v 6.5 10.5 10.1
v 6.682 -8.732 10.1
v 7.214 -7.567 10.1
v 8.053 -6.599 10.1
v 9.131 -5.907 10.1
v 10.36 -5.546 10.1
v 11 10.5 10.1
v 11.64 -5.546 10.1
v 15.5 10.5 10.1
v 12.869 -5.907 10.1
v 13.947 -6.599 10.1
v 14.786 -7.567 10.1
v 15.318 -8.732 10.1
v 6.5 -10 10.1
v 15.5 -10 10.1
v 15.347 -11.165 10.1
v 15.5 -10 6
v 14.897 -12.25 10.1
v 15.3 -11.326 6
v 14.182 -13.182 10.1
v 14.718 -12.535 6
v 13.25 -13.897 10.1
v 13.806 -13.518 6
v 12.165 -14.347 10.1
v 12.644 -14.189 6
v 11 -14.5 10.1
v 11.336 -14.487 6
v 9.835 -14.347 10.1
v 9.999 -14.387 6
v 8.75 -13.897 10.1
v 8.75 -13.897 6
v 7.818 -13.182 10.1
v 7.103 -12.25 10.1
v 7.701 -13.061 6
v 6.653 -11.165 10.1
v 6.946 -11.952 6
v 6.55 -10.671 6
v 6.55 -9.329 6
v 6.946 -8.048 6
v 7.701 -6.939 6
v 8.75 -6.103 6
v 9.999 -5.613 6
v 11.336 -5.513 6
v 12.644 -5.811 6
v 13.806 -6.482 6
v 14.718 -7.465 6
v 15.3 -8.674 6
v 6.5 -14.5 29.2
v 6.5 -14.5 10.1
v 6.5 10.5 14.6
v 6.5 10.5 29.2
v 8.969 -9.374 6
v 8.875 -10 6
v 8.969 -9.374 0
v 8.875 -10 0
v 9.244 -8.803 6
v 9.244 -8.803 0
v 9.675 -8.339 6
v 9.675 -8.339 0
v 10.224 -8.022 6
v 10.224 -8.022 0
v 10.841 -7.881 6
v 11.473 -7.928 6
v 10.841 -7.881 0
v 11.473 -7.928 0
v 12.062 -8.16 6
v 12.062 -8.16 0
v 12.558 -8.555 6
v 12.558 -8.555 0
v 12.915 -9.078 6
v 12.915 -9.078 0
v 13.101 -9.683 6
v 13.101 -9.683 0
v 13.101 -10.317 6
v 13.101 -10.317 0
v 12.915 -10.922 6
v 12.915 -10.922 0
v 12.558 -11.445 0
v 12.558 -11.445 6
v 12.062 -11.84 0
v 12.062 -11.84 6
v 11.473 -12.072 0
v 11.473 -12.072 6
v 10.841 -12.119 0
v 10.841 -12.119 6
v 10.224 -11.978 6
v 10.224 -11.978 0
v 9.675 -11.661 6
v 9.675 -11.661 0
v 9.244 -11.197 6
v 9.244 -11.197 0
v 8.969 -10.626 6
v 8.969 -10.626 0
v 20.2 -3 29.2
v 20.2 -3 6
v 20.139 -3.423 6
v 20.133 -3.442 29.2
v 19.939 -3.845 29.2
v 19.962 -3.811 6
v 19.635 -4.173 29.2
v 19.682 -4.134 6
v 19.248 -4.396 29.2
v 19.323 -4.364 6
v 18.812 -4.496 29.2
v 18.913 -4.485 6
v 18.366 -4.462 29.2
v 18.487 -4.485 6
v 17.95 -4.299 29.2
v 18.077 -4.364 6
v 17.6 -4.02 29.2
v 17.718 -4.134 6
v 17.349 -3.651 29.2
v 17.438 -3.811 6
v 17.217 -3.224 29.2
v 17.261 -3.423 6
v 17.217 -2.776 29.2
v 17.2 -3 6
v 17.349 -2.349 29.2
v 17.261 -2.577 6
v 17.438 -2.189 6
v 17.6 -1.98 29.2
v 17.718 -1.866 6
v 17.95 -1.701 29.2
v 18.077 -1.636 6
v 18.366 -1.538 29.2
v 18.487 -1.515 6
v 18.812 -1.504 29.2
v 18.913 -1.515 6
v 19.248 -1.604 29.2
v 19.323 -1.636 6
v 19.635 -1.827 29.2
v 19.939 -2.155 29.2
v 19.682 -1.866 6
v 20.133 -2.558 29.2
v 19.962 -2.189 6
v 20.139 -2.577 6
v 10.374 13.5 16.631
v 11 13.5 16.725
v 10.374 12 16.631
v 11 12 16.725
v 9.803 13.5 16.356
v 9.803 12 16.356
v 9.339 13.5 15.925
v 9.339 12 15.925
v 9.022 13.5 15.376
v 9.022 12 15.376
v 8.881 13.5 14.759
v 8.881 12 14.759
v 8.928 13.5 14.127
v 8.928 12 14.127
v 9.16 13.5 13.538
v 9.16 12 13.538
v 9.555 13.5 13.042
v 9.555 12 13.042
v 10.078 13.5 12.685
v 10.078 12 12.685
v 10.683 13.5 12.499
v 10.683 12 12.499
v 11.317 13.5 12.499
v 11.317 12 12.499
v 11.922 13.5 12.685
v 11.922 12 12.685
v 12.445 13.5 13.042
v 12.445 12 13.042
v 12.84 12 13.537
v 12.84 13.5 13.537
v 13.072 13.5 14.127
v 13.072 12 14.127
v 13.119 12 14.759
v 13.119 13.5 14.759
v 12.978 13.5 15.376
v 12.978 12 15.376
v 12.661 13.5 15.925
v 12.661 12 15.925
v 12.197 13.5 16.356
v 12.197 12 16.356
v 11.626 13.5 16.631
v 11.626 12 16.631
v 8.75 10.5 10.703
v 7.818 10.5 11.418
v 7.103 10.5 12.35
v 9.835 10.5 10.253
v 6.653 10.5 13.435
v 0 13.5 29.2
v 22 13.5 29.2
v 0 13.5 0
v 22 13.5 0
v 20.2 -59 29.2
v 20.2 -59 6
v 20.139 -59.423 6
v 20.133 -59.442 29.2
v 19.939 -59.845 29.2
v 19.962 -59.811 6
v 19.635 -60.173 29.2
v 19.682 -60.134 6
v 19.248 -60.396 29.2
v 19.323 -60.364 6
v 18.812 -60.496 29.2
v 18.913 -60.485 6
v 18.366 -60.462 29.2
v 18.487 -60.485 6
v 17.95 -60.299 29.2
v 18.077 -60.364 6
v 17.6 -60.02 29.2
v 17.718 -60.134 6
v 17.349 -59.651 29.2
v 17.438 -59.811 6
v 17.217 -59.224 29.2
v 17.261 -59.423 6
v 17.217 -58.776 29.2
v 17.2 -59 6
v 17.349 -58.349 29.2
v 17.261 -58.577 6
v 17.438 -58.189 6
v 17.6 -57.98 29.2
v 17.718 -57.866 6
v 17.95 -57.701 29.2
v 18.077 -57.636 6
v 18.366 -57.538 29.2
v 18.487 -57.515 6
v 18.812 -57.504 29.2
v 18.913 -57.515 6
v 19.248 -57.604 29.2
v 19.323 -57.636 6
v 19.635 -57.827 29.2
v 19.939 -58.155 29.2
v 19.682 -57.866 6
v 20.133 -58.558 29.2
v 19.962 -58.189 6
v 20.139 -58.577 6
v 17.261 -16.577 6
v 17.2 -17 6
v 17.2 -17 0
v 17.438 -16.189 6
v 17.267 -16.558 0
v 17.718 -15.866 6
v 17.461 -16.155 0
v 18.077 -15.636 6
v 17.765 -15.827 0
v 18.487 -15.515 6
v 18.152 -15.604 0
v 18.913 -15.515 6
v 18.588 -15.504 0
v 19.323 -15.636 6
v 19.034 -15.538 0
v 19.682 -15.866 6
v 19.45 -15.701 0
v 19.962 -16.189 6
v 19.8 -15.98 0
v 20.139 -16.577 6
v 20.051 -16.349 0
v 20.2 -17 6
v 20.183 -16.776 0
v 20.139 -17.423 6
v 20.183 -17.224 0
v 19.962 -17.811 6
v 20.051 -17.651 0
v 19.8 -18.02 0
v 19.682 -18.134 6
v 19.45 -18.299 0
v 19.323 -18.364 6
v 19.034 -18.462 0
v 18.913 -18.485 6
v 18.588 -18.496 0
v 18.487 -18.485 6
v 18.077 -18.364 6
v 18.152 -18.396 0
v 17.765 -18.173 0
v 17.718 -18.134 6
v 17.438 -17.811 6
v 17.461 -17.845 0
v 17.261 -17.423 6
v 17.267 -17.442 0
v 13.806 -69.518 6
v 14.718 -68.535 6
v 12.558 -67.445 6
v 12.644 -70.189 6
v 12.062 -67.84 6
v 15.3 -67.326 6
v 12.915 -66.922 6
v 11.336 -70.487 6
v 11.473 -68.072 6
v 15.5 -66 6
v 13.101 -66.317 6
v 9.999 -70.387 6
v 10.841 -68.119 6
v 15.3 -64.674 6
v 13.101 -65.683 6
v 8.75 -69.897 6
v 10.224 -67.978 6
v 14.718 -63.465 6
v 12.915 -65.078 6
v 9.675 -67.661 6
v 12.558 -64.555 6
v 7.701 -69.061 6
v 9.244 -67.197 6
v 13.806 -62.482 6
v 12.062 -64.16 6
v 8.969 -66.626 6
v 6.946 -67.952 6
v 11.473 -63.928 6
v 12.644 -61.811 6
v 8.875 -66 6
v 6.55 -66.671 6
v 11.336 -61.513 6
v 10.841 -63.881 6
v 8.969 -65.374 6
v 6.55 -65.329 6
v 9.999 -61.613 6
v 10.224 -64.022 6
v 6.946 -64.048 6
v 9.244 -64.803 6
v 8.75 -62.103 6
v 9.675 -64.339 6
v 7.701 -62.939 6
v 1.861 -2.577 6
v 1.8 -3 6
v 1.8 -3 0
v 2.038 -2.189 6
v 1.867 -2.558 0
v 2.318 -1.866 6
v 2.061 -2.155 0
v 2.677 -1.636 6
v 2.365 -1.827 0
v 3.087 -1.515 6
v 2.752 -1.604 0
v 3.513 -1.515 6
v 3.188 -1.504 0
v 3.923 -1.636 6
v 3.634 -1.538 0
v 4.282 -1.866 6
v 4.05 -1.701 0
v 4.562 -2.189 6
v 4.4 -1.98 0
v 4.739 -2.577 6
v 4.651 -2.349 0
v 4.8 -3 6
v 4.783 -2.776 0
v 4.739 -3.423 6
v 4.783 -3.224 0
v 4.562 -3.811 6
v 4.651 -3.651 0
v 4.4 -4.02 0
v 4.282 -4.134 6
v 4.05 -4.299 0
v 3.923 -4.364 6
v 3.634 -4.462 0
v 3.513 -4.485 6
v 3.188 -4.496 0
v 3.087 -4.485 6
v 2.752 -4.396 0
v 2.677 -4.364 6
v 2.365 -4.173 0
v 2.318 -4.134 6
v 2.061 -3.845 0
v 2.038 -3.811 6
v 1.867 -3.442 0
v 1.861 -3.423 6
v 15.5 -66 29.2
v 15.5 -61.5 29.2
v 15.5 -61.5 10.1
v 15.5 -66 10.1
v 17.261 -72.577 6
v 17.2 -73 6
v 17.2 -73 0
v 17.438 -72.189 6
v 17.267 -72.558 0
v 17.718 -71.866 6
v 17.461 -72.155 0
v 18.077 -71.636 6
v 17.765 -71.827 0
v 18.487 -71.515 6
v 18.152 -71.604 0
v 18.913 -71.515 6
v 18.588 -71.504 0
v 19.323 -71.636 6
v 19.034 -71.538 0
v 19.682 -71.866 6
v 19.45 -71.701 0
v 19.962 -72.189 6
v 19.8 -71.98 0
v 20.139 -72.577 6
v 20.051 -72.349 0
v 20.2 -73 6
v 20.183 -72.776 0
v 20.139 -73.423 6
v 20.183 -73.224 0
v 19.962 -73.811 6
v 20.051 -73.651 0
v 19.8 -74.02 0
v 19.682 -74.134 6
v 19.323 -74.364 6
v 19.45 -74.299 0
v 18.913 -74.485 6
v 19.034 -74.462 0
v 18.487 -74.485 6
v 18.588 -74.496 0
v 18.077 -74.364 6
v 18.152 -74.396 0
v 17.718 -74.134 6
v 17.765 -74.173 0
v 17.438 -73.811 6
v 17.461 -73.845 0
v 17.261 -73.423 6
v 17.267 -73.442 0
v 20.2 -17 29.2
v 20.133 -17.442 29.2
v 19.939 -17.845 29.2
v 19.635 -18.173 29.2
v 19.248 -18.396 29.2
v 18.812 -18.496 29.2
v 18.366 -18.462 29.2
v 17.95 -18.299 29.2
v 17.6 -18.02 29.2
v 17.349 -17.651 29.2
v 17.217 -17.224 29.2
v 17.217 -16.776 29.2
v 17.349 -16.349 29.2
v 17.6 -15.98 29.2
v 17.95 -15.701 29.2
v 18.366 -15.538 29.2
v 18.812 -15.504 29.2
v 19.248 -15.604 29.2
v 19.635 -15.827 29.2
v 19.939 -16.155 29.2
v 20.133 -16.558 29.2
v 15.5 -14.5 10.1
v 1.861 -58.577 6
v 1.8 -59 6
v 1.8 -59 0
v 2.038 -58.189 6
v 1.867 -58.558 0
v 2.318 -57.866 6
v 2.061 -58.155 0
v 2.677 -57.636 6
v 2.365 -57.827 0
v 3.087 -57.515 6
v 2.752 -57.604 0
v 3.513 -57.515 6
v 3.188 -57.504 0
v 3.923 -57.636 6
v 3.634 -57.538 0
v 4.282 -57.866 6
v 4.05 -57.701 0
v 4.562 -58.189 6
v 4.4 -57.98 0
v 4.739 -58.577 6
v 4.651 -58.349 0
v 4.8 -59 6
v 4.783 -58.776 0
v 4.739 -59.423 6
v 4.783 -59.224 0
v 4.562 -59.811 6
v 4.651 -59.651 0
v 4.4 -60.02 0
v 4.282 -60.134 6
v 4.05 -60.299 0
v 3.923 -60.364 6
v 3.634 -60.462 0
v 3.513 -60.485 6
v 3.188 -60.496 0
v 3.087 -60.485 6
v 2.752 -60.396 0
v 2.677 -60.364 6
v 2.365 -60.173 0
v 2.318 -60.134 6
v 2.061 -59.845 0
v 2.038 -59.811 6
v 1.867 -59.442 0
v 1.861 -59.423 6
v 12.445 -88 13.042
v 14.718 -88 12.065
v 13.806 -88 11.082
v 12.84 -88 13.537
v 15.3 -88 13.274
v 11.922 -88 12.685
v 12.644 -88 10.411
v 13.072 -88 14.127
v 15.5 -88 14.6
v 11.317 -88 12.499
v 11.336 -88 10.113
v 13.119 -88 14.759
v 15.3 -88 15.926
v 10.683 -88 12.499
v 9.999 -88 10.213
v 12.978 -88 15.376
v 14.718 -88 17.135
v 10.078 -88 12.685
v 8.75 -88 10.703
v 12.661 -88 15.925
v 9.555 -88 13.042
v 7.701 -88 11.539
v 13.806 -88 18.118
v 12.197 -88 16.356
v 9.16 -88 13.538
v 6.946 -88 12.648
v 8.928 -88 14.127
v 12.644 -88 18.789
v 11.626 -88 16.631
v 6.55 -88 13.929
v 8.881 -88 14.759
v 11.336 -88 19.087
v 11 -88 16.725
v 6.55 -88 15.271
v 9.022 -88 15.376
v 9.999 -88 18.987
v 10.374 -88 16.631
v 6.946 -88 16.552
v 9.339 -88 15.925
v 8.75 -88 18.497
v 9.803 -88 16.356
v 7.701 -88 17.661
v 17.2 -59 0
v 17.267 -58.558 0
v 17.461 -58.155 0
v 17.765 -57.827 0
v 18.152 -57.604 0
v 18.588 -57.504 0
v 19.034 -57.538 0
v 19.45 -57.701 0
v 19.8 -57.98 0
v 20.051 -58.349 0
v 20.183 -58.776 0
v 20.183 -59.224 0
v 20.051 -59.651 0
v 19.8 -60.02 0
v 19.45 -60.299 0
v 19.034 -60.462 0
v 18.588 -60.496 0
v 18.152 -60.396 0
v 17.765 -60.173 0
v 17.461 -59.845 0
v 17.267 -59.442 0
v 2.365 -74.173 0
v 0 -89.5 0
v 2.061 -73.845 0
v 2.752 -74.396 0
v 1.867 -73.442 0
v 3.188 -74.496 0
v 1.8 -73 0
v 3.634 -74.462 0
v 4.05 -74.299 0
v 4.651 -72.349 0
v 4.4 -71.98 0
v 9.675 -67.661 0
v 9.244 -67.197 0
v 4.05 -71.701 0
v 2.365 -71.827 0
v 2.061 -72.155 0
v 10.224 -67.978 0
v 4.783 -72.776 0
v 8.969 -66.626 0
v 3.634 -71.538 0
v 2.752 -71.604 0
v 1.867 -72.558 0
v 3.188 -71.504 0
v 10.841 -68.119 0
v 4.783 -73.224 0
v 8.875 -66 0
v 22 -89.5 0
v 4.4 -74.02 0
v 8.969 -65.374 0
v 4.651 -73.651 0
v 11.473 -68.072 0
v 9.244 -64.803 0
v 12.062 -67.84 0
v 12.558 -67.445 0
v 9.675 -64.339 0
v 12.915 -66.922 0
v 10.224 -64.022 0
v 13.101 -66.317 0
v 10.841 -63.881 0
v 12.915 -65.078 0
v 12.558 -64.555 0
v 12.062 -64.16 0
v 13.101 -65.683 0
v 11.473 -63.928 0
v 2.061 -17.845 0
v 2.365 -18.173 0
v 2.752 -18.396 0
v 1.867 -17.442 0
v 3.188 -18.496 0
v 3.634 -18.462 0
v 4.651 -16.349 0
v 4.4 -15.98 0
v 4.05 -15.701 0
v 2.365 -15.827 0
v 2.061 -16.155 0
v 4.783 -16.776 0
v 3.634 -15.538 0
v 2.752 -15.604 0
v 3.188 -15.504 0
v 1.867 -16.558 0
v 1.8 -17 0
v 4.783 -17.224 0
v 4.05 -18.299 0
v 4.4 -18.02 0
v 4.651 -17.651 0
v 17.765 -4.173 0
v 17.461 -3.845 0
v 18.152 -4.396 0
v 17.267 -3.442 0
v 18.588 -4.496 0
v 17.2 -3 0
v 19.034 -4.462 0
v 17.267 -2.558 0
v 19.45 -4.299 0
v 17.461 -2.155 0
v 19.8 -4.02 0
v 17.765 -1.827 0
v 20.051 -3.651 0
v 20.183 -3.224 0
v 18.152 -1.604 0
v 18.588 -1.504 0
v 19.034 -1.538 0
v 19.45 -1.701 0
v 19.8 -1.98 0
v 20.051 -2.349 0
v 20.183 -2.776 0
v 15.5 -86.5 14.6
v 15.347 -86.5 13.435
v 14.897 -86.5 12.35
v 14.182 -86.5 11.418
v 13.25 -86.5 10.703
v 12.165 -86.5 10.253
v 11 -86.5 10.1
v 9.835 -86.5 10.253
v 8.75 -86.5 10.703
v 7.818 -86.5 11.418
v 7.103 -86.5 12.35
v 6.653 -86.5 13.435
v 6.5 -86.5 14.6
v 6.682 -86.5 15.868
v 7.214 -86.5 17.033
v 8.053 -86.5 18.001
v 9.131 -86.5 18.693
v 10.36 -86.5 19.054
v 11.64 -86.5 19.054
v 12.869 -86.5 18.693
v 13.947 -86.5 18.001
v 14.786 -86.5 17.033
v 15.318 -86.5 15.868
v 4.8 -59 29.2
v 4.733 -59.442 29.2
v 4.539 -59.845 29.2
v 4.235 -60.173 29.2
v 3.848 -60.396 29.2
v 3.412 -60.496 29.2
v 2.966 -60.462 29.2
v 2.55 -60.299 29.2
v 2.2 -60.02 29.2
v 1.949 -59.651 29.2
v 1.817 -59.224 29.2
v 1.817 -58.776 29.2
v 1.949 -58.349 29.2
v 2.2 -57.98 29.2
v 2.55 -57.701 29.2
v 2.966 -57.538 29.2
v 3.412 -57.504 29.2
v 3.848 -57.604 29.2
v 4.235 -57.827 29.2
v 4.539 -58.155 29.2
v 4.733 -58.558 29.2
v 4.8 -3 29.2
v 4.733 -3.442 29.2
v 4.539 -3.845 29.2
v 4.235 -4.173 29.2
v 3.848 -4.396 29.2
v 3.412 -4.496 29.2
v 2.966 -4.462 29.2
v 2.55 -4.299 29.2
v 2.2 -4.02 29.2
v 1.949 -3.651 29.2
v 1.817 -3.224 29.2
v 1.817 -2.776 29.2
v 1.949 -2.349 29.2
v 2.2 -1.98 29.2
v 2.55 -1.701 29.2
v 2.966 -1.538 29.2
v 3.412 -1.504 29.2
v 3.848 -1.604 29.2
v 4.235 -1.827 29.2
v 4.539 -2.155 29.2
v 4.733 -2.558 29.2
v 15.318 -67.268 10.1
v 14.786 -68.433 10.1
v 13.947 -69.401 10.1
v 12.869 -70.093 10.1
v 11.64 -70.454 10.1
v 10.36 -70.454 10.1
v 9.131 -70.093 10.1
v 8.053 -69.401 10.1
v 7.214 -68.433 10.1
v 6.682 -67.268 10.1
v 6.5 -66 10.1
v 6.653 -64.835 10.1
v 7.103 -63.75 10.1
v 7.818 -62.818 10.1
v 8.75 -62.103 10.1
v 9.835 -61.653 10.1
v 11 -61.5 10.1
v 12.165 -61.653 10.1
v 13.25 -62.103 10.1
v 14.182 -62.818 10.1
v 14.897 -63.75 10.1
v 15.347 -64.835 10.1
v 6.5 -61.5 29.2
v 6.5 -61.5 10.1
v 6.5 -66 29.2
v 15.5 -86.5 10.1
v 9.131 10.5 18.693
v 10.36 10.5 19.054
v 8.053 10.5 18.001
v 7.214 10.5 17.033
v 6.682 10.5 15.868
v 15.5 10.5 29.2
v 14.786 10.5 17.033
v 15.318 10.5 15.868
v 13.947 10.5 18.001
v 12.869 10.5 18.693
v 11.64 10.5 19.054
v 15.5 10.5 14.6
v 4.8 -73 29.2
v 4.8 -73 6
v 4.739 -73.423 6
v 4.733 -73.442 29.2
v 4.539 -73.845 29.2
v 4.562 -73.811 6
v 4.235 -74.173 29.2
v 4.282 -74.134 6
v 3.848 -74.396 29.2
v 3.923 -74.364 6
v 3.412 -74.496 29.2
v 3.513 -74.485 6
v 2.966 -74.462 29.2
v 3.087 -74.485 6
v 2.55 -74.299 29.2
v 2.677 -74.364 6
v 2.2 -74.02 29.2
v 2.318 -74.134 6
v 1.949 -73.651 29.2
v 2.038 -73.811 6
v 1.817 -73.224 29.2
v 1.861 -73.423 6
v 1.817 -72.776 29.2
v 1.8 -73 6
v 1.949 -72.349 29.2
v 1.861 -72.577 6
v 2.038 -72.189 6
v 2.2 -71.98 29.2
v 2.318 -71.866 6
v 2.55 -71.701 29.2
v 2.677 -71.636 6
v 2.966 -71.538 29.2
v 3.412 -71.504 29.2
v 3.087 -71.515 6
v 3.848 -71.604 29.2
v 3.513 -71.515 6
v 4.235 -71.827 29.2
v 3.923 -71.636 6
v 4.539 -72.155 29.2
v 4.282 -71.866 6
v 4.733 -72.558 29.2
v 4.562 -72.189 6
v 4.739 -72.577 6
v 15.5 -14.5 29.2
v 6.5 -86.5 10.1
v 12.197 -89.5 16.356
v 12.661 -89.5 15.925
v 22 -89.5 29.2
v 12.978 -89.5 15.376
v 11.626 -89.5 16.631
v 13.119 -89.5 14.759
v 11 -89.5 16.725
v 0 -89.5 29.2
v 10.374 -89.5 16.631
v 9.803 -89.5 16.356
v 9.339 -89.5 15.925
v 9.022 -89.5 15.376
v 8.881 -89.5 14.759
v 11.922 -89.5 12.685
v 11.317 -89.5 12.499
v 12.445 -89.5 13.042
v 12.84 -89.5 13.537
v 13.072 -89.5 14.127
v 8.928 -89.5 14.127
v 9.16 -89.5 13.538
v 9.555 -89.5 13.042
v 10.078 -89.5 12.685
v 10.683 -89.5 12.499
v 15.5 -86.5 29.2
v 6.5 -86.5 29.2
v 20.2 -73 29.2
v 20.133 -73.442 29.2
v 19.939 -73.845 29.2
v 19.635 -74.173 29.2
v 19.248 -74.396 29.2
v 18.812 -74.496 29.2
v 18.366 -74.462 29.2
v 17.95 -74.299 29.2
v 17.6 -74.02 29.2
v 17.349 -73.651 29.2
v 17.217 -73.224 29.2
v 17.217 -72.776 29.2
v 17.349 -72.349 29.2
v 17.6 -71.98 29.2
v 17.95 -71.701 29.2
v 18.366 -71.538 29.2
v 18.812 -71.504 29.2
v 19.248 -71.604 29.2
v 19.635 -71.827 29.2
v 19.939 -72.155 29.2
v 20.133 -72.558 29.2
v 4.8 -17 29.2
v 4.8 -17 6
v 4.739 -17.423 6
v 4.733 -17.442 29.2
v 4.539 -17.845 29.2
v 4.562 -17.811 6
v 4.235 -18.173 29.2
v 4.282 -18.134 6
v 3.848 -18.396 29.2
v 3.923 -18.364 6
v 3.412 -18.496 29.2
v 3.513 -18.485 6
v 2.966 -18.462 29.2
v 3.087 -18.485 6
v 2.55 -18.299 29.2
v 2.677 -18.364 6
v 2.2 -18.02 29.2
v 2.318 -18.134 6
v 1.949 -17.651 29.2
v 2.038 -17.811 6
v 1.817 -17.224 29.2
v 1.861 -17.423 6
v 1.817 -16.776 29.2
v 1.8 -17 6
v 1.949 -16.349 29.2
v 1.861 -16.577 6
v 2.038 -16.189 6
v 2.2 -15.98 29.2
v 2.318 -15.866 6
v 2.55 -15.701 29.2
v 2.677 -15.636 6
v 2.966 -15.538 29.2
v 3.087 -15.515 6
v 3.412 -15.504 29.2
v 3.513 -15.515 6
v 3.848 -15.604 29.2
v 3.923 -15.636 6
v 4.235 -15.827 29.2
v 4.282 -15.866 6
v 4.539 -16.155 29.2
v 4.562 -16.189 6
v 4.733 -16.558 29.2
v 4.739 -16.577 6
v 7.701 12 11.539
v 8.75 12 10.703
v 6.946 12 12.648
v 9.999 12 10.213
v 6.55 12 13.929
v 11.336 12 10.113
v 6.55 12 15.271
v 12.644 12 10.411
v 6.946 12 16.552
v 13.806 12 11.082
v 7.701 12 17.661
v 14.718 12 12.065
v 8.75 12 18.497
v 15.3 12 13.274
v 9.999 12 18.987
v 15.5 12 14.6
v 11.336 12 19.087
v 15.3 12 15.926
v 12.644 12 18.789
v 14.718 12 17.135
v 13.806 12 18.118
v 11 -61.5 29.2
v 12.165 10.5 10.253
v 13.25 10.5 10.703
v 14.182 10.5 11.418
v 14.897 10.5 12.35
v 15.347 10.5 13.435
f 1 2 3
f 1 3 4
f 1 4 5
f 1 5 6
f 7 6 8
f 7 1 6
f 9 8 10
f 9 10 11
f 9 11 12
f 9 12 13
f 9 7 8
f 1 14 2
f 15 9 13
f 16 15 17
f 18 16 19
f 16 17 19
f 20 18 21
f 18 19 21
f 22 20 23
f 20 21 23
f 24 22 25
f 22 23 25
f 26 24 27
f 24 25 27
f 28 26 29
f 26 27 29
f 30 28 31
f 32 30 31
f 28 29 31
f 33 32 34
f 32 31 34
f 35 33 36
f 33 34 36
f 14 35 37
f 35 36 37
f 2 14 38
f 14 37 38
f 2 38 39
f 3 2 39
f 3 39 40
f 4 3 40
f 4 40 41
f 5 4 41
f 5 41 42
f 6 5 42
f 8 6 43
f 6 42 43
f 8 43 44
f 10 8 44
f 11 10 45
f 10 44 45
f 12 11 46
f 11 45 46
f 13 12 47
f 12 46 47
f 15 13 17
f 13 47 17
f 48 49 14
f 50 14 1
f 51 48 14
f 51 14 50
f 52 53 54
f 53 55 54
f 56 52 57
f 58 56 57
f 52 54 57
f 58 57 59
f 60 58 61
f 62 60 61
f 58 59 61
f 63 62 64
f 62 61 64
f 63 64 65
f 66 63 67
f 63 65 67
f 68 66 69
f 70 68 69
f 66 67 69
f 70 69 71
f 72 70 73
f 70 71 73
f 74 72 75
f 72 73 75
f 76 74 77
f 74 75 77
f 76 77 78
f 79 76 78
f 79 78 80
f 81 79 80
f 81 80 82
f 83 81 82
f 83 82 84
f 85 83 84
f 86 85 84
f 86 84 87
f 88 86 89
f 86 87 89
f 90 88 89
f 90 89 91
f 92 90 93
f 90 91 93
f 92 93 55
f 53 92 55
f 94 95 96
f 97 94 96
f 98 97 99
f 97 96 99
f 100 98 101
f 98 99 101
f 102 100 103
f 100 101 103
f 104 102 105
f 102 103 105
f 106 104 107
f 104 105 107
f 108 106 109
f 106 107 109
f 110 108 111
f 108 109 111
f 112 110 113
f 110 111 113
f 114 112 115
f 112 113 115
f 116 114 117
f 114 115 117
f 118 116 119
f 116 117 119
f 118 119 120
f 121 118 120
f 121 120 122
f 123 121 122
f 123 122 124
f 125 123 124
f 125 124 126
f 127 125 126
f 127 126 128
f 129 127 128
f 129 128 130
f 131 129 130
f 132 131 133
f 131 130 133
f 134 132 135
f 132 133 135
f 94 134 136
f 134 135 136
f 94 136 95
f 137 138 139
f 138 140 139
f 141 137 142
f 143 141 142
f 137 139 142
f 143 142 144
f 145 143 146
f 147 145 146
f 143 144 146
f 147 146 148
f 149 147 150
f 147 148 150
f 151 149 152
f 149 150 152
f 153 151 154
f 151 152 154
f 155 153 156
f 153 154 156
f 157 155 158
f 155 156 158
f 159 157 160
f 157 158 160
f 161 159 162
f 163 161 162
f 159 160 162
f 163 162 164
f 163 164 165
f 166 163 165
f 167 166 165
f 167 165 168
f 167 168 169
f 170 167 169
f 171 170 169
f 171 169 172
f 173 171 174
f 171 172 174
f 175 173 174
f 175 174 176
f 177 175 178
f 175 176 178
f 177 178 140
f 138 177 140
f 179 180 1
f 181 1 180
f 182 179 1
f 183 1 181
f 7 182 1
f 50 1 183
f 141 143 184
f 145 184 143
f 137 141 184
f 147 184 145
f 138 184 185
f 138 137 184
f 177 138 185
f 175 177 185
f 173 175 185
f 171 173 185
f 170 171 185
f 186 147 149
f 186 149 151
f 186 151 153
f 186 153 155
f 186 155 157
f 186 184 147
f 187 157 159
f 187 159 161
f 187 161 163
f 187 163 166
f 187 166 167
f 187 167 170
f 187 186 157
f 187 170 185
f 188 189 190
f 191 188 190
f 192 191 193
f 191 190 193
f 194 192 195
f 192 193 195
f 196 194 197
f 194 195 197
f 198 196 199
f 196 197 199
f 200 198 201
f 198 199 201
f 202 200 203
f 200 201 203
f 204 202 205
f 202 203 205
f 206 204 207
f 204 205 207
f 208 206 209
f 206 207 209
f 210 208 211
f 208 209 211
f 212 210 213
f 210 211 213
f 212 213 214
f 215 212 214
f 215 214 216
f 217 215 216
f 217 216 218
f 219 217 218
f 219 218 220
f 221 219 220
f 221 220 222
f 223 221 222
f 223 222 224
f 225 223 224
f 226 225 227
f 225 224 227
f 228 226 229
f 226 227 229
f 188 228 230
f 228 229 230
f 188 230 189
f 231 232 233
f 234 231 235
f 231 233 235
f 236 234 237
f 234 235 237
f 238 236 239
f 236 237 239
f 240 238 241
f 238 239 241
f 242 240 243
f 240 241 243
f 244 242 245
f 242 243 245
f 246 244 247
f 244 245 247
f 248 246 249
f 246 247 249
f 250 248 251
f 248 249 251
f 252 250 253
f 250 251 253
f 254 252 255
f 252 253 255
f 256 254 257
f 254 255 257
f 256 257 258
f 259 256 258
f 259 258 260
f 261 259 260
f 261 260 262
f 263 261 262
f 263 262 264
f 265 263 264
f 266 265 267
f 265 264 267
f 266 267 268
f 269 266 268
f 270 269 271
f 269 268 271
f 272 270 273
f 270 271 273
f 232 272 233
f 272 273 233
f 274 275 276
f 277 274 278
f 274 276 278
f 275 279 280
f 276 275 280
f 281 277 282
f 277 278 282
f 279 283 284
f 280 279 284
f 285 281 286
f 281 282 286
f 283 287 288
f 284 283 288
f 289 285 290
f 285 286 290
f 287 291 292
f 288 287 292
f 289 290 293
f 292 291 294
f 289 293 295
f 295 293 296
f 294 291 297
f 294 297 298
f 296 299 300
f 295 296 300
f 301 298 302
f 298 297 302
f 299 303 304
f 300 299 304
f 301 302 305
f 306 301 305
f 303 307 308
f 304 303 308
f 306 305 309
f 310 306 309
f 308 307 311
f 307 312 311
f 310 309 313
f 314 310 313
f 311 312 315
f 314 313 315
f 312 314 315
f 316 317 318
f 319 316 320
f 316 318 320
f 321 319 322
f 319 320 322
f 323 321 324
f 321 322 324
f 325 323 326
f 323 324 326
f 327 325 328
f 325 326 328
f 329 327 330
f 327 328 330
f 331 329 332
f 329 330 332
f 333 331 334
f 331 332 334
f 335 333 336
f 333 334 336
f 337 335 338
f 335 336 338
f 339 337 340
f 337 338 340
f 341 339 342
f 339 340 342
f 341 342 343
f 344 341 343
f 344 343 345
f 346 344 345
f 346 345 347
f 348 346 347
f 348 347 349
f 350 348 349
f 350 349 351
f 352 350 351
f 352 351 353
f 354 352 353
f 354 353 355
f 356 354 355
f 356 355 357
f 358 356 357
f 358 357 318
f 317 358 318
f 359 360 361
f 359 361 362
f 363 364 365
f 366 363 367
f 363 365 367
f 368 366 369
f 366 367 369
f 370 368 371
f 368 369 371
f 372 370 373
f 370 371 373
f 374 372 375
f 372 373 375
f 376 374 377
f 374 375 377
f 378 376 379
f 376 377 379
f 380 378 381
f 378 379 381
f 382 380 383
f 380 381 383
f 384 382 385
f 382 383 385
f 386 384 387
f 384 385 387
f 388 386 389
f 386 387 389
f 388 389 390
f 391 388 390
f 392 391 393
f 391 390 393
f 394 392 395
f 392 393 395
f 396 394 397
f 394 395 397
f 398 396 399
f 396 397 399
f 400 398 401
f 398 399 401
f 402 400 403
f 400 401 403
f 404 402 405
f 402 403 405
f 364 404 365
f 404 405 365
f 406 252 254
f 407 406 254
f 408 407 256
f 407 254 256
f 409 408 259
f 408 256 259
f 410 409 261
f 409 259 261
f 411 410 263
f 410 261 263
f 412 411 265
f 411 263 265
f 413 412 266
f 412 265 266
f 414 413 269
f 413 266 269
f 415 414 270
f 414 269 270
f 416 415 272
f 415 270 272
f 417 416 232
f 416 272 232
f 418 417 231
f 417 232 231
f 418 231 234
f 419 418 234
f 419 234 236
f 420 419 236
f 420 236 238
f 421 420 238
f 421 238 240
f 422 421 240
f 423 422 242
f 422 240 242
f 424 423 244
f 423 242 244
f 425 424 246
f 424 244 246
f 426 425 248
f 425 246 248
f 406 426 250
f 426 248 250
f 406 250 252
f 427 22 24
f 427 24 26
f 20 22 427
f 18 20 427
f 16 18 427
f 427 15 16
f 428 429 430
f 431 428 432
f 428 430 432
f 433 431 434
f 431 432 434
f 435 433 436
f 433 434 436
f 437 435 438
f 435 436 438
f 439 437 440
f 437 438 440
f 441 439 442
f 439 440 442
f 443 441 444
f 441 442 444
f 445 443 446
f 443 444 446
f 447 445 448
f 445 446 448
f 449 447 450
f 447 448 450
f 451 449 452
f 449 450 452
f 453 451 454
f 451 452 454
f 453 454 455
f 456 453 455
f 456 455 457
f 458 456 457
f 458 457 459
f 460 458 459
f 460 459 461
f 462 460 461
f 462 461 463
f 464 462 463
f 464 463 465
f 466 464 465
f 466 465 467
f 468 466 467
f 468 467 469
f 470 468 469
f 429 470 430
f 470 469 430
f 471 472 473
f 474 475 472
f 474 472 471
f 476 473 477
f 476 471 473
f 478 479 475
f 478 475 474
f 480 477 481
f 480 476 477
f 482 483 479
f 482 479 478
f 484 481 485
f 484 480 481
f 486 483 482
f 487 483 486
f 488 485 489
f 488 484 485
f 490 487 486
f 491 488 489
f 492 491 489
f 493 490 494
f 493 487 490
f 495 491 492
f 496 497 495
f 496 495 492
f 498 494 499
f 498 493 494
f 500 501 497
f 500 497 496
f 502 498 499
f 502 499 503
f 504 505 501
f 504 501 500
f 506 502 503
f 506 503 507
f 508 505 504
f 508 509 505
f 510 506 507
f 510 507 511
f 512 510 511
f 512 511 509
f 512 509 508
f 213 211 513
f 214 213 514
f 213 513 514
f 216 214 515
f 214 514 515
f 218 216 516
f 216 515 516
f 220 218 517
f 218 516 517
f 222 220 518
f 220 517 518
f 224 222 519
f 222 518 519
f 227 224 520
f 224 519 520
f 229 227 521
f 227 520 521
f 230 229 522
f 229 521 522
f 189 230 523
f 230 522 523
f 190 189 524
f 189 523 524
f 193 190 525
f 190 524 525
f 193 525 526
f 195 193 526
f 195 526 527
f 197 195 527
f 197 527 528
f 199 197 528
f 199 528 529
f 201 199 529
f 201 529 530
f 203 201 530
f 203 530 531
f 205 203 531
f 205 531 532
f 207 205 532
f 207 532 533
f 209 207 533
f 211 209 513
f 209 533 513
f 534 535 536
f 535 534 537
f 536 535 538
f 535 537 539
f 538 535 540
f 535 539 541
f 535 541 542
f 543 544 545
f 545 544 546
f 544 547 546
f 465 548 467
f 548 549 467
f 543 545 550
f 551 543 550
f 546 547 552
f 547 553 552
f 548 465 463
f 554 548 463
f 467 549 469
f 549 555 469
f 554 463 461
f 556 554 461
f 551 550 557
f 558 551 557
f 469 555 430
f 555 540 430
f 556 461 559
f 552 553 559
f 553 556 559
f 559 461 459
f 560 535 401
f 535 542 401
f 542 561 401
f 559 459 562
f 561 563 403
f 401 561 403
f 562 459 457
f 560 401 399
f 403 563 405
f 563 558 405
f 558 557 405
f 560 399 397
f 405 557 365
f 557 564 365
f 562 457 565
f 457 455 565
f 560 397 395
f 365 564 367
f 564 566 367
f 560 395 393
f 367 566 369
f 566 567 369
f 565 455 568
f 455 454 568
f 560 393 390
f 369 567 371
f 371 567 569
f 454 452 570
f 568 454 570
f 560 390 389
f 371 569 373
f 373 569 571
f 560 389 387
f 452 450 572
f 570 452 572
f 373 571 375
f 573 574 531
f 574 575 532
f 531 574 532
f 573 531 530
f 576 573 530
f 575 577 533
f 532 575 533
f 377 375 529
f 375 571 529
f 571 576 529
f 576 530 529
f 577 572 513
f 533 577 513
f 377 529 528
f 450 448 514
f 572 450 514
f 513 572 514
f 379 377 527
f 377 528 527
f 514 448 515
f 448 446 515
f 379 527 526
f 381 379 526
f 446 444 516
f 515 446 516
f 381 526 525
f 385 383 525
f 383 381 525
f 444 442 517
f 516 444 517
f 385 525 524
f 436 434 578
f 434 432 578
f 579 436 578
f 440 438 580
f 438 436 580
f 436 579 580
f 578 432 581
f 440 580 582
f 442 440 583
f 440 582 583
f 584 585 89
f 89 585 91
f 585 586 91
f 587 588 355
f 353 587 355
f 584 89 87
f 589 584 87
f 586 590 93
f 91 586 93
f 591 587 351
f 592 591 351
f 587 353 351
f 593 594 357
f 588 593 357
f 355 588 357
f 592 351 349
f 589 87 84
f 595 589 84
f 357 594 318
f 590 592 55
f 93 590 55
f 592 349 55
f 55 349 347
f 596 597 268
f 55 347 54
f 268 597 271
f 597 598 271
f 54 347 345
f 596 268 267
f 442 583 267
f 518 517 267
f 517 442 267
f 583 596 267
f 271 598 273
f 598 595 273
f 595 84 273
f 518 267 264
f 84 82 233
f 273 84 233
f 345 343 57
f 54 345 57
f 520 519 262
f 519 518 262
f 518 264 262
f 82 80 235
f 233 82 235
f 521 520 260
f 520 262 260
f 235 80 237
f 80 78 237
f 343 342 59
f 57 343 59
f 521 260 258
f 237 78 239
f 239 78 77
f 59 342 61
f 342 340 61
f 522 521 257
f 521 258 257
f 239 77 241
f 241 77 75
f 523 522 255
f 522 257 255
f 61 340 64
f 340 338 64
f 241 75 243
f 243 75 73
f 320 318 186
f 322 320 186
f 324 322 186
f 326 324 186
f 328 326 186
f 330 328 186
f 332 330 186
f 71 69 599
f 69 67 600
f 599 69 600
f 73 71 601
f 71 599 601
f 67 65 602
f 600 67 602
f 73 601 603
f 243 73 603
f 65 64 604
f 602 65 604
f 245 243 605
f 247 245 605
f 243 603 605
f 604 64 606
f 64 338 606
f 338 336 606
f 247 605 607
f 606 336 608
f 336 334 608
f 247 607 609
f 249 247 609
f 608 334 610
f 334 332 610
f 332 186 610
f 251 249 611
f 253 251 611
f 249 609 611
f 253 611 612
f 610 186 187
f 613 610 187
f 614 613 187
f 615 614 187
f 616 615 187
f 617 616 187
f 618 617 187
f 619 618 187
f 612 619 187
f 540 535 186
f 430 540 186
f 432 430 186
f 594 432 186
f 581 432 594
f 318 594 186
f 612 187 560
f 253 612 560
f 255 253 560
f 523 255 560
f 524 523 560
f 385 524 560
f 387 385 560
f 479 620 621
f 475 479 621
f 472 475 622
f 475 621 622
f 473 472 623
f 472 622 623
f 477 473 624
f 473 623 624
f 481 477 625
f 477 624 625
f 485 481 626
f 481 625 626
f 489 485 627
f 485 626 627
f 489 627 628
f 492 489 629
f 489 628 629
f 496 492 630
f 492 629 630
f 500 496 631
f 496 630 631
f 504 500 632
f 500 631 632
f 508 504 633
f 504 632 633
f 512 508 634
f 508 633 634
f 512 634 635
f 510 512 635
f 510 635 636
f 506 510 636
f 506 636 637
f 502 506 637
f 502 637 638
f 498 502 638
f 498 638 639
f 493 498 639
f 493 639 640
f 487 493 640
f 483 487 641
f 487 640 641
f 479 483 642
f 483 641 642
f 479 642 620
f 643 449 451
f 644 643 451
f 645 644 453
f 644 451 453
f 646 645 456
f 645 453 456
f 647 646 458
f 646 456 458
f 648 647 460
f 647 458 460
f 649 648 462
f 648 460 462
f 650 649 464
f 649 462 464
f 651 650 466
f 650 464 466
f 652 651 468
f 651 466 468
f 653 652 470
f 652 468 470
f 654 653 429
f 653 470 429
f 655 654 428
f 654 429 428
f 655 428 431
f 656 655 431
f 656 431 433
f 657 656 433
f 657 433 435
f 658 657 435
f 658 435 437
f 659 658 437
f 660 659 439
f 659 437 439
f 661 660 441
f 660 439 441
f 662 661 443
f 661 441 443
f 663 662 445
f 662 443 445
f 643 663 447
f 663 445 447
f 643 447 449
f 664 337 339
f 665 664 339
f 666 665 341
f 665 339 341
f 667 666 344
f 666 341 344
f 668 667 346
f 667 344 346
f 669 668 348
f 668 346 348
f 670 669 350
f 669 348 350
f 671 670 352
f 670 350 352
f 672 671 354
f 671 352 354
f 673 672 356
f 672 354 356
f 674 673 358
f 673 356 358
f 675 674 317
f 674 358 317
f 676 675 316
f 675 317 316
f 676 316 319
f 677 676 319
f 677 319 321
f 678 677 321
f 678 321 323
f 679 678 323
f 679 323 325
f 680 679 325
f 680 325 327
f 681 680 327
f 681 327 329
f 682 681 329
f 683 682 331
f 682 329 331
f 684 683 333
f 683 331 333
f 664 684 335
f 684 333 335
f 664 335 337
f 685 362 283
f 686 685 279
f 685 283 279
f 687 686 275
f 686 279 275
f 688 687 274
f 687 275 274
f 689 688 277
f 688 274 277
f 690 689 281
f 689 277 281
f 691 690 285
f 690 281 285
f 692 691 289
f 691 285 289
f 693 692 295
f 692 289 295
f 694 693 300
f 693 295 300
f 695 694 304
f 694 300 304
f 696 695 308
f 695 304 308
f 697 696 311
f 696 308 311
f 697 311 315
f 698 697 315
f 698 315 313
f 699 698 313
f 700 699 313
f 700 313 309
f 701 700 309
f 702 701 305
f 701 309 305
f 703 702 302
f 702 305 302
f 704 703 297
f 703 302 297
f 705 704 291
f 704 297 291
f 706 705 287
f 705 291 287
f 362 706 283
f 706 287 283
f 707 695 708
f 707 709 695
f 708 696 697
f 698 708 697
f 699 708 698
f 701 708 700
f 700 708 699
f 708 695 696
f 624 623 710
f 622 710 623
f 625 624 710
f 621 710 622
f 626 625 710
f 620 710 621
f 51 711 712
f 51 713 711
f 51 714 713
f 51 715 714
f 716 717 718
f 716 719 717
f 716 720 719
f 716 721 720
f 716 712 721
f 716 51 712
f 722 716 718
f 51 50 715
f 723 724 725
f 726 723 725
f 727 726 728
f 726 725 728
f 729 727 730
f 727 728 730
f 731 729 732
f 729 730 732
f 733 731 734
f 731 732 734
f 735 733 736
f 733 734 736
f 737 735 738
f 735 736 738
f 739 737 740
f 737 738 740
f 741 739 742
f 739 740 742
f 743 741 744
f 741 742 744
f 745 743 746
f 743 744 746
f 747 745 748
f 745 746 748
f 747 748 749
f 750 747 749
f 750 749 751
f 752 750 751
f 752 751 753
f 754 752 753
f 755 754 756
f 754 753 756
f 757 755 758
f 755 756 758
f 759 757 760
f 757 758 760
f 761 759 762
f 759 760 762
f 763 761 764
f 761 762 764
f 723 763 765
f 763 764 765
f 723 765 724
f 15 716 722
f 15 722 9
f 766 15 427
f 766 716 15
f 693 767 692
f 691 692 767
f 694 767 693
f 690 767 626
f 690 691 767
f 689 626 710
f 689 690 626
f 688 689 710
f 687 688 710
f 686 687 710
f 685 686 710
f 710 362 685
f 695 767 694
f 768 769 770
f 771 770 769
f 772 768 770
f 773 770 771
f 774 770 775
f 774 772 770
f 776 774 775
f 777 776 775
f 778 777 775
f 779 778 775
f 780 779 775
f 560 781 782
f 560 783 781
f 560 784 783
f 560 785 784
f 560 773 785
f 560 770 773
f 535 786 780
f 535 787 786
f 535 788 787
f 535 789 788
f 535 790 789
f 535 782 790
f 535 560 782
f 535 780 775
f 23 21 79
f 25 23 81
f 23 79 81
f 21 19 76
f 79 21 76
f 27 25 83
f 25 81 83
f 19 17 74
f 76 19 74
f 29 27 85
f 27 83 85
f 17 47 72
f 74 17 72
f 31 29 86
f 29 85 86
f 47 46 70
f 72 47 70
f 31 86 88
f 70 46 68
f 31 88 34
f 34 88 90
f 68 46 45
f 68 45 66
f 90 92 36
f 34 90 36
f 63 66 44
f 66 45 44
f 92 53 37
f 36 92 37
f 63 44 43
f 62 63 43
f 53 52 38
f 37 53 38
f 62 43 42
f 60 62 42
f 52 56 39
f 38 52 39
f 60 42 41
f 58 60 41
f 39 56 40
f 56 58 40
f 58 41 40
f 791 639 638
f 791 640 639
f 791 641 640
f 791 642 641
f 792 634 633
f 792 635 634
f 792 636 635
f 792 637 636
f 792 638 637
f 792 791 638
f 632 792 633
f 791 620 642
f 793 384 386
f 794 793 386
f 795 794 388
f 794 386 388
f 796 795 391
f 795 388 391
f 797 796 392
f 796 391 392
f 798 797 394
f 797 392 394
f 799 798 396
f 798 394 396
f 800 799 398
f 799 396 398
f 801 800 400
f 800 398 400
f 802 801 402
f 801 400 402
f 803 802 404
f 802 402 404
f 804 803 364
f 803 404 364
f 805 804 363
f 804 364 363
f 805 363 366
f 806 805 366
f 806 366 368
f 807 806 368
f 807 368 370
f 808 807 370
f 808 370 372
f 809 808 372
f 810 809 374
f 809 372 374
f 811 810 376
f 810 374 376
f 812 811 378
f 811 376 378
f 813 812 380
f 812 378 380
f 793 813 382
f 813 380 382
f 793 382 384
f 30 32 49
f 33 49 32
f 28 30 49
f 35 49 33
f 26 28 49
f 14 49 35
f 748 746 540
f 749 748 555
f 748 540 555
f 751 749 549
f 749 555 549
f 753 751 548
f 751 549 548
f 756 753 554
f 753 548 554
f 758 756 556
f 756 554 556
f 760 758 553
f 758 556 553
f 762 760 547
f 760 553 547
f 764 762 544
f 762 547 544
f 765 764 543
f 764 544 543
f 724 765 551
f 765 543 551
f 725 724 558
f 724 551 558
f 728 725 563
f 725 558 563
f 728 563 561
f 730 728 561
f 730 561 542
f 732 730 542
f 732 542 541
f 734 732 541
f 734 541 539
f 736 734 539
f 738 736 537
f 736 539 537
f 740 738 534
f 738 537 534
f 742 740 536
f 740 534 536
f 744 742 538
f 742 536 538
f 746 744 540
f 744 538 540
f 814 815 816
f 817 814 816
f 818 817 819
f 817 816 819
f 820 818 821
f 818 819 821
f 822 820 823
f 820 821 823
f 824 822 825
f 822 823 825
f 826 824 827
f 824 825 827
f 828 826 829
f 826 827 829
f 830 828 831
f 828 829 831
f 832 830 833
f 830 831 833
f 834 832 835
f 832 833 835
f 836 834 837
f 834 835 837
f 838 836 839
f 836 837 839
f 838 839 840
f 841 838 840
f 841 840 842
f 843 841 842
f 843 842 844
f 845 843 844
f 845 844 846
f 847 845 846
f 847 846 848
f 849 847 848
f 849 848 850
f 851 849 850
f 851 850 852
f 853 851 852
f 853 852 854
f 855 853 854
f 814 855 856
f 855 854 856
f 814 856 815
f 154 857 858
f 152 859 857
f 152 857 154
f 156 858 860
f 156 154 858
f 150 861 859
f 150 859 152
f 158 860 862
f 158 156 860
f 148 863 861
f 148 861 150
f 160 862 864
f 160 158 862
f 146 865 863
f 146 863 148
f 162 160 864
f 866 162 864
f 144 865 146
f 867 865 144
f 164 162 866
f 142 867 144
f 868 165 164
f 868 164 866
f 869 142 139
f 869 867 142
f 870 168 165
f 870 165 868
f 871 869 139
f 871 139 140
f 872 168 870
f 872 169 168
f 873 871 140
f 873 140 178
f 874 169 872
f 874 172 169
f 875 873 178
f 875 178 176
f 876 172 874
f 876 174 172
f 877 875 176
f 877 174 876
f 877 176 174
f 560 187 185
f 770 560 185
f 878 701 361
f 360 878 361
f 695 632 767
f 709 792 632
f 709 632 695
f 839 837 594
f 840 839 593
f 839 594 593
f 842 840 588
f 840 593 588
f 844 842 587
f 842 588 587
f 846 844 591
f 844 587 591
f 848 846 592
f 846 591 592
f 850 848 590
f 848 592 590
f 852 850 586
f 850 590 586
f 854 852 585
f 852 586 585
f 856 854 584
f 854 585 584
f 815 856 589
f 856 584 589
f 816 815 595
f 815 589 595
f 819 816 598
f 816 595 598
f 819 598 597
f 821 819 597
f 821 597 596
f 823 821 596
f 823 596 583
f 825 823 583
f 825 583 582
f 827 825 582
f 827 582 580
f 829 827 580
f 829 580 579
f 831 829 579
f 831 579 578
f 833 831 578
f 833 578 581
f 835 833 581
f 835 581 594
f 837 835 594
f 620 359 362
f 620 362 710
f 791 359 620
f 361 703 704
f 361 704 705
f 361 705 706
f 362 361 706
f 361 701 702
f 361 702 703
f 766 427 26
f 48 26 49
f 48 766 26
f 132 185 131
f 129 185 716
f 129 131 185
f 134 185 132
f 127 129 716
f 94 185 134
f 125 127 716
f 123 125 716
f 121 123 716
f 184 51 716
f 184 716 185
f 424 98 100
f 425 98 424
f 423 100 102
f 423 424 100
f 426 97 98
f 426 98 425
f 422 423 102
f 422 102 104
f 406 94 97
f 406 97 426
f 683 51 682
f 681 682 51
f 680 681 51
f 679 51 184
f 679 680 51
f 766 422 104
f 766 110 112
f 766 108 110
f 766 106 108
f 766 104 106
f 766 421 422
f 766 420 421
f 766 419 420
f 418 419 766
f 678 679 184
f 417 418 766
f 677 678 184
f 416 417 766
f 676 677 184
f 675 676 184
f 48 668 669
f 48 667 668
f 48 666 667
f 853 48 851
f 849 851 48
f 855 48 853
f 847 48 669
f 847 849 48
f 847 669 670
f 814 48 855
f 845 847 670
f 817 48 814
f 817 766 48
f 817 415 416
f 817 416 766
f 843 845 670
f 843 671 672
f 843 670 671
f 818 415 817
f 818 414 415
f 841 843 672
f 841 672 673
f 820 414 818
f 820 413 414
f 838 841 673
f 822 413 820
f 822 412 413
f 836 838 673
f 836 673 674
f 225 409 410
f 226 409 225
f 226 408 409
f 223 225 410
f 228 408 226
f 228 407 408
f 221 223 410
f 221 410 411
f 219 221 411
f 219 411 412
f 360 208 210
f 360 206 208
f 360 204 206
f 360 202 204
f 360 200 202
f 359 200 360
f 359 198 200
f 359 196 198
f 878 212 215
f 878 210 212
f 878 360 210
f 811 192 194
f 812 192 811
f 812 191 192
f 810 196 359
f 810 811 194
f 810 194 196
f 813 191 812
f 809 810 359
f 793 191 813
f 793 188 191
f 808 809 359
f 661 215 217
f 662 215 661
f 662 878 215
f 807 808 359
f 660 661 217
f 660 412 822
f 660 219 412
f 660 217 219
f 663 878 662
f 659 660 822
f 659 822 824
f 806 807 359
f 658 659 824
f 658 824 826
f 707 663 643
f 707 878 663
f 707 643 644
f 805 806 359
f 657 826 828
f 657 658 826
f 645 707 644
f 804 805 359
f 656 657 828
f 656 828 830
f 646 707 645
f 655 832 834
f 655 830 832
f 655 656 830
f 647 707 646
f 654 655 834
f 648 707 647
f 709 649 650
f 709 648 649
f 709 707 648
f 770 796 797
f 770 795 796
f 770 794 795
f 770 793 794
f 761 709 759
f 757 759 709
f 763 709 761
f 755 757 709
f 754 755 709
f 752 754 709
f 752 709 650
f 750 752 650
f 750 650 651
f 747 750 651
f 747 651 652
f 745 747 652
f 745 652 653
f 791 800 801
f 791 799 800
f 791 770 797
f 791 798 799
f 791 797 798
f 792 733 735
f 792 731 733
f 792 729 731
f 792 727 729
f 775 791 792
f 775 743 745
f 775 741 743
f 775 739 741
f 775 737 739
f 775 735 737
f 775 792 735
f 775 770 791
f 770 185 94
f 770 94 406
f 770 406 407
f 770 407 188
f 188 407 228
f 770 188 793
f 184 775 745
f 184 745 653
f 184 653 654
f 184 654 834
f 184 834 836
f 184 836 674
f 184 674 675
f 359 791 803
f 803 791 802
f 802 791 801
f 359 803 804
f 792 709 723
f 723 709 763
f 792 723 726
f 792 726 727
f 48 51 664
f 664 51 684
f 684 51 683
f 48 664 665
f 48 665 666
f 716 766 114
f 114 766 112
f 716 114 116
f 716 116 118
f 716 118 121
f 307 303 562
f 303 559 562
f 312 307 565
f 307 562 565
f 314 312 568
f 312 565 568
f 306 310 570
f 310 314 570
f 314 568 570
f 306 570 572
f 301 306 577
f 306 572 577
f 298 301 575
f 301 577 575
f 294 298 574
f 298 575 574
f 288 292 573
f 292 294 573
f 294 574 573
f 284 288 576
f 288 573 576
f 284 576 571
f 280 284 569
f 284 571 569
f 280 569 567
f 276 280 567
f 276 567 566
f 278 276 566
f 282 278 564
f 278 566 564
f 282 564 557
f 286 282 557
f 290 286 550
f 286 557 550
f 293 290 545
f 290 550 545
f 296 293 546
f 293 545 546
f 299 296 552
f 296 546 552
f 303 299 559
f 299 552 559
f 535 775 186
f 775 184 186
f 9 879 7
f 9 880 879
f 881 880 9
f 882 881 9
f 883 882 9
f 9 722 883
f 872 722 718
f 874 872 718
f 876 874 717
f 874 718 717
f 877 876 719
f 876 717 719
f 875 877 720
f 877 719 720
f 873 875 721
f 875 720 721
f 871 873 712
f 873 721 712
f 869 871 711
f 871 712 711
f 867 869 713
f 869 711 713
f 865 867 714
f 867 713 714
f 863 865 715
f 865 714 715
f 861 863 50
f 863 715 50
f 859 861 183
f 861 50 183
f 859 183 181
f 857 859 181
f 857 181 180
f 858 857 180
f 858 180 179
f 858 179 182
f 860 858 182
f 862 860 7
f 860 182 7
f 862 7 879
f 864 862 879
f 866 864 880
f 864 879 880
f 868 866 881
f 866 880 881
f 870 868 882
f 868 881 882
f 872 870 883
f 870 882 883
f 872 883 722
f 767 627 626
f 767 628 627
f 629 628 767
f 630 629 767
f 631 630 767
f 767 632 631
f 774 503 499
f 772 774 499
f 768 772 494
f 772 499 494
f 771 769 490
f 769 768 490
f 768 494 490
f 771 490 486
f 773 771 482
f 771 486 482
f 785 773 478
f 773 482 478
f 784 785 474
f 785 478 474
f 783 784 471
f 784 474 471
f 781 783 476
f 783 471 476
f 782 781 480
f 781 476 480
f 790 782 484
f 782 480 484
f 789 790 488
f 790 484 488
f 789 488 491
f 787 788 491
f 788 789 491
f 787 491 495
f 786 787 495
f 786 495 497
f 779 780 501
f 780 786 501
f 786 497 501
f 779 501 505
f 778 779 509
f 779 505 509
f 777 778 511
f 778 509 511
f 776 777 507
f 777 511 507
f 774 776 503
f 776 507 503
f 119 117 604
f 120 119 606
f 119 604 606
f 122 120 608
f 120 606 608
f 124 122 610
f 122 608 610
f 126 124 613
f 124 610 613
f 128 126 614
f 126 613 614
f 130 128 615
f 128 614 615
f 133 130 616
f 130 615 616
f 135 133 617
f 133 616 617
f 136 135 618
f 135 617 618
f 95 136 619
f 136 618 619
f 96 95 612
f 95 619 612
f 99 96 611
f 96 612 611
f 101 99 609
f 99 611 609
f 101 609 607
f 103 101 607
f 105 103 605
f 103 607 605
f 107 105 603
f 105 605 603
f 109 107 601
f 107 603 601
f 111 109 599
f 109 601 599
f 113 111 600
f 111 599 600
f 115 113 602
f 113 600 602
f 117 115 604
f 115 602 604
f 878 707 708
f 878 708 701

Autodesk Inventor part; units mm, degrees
ref_plane "YZ Plane" through (0, 0, 0) normal (1, 0, 0) x (0, 1, 0)
ref_plane "XZ Plane" through (0, 0, 0) normal (0, 1, 0) x (-1, 0, 0)
ref_plane "XY Plane" through (0, 0, 0) normal (0, 0, 1) x (1, 0, 0)
ref_plane "Płaszczyzna konstrukcyjna1" through (33, 3, -33.6408) normal (0, 1, 0) x (0, 0, 1)
sketch "Szkic1" plane through (33, 3, -33.6408) normal (0, 1, 0) x (0, 0, 1)
  line L0 (33.6408, -11) -> (70.3592, -11) projected
  line L1 (33.6408, -33) -> (33.6408, -11) projected
  line L2 (33.6408, -11) -> (70.3592, -11)
  line L3 (70.3592, -11) -> (70.3592, -33)
  line L4 (70.3592, -33) -> (33.6408, -33)
  line L5 (33.6408, -33) -> (33.6408, -11)
extrude "Wyciągnięcie proste1" add sketch "Szkic1" against normal blind 3
sketch "Szkic2" plane through (33, 0, -33.6408) normal (0, -1, 0) x (1, 0, 0)
  line L0 (-11, 33.6408) -> (-33, 33.6408)
  line L1 (-33, 33.6408) -> (-33, 39.6408)
  line L2 (-33, 39.6408) -> (-11, 39.6408)
  line L3 (-11, 39.6408) -> (-11, 33.6408)
  line L4 (-33, 33.6408) -> (-11, 33.6408) projected
  line L5 (-11, 33.6408) -> (-11, 70.3592) projected
  line L6 (-33, 70.3592) -> (-33, 33.6408) projected
  dimension "d2" = 6
extrude "Wyciągnięcie proste2" add sketch "Szkic2" along normal blind 20
sketch "Szkic3" plane through (22, 3, 0) normal (0, 0, -1) x (-1, 0, 0)
  circle A0 centre (18.7, -6) radius 1.25 projected
  circle A1 centre (3.3, -6) radius 1.25 projected
  circle A2 centre (3.3, -20) radius 1.25 projected
  circle A3 centre (18.7, -20) radius 1.25 projected
  circle A4 centre (11, -13) radius 2.125 projected
  circle A5 centre (18.7, -6) radius 1.5
  circle A6 centre (18.7, -20) radius 1.5
  circle A7 centre (3.3, -6) radius 1.5
  circle A8 centre (3.3, -20) radius 1.5
  point P0 (22, -3)
  dimension "d5" = 0.25
  dimension "d6" = 0.25
  dimension "d7" = 0.25
  dimension "d8" = 0.25
extrude "Wyciągnięcie proste3" cut sketch "Szkic3" against normal through all contours A0 | A1 | A2 | A3 | A4 | A5 | A6 | A7 | A8
sketch "Szkic4" plane through (33, 3, -33.6408) normal (0, 1, 0) x (1, 0, 0)
  line L0 (-33, -48.2408) -> (-22, -48.2408) construction
  line L1 (-22, -48.2408) -> (-11, -48.2408) construction
  line L2 (-11, -70.3592) -> (-11, -33.6408) projected
  line L3 (-33, -33.6408) -> (-33, -70.3592) projected
  line L4 (-11, -33.6408) -> (-33, -33.6408) projected
  line L5 (-22, -48.2408) -> (-22, -33.6408) construction
  line L6 (-22, -48.2408) -> (-22, -62.8408) construction
  line L7 (-11, -33.6408) -> (-33, -33.6408)
  line L8 (-33, -33.6408) -> (-33, -62.8408)
  line L9 (-33, -62.8408) -> (-11, -62.8408)
  line L10 (-11, -62.8408) -> (-11, -33.6408)
  point P0 (-11, -62.8408)
  dimension "d11" = 14.6
extrude "Wyciągnięcie proste4" cut sketch "Szkic4" against normal through all keep common part
sketch "Szkic6" plane through (33, 3, -33.6408) normal (0, 1, 0) x (1, 0, 0)
  line L0 (-11, -62.8408) -> (-33, -62.8408) projected
  line L1 (-11, -62.8408) -> (-11, -33.6408) projected
  line L2 (-11, -33.6408) -> (-33, -33.6408) projected
  line L3 (-33, -33.6408) -> (-33, -62.8408) projected
extrude "Wyciągnięcie proste5" add sketch "Szkic6" along normal blind 10.5
hole "Otwór3" at (11, 3, 14.6) direction (0, -1, 0) diameter 4.25 end through all both
sketch "Szkic7" plane through (33, 0, -33.6408) normal (0, -1, 0) x (1, 0, 0)
  circle A0 centre (-22, 48.2408) radius 2.125 projected
  circle A1 centre (-22, 48.2408) radius 4.5
  point P0 (-33, 33.6408)
  dimension "d37" = 9
extrude "Wyciągnięcie proste6" cut sketch "Szkic7" against normal blind 12 contours A0 | A1
sketch "Szkic8" plane through (33, -20, -33.6408) normal (0, -1, 0) x (1, 0, 0)
  line L0 (-33, 33.6408) -> (-11, 33.6408) projected
  line L1 (-11, 33.6408) -> (-11, 39.6408) projected
  line L2 (-11, 39.6408) -> (-33, 39.6408) projected
  line L3 (-33, 39.6408) -> (-33, 33.6408) projected
extrude "Wyciągnięcie proste7" add sketch "Szkic8" along normal blind 18
mirror "Odbij1" about plane through (11, -38, 3) normal (0, -1, 0)
sketch "Szkic9" plane through (0, 0, 6) normal (0, 0, 1) x (1, 0, 0)
  circle A0 centre (11, -66) radius 2.125 projected
  circle A1 centre (18.7, -73) radius 1.5 projected
  circle A2 centre (3.3, -73) radius 1.5 projected
  circle A3 centre (18.7, -59) radius 1.5 projected
  circle A4 centre (3.3, -59) radius 1.5 projected
  circle A5 centre (3.3, -17) radius 1.5 projected
  circle A6 centre (18.7, -17) radius 1.5 projected
  circle A7 centre (3.3, -3) radius 1.5 projected
  circle A8 centre (18.7, -3) radius 1.5 projected
  circle A9 centre (11, -10) radius 2.125 projected
  line L0 (0, 0) -> (22, 0) projected
  line L1 (0, 0) -> (0, -76) projected
  line L2 (0, -76) -> (22, -76) projected
  line L3 (22, 0) -> (22, -76) projected
  circle A10 centre (11, -66) radius 2.125 projected
  circle A11 centre (11, -66) radius 4.5
  circle A12 centre (11, -10) radius 4.5
  point P0 (0, 0)
  dimension "d42" = 9
  dimension "d43" = 9
extrude "Wyciągnięcie proste8" add sketch "Szkic9" along normal up to surface (23.2 mm away) contours L0 L3 L2 L1
sketch "Szkic11" plane through (0, 13.5, 29.2) normal (0, 0, 1) x (1, 0, 0)
  line L0 (6.5, -3) -> (15.5, -3)
  line L1 (15.5, -3) -> (15.5, -28)
  line L2 (15.5, -28) -> (6.5, -28)
  line L3 (6.5, -28) -> (6.5, -3)
  line L4 (6.5, -75) -> (15.5, -75)
  line L5 (15.5, -75) -> (15.5, -100)
  line L6 (15.5, -100) -> (6.5, -100)
  line L7 (6.5, -100) -> (6.5, -75)
  line L8 (0, 0) -> (0, -103) construction
  line L9 (0, 0) -> (6.5, -3) construction
  line L10 (15.5, -3) -> (22, 0) construction
  line L11 (0, 0) -> (22, 0) construction
  line L12 (0, -103) -> (22, -103) construction
  circle A0 centre (11, -23.5) radius 4.5 projected
  circle A1 centre (11, -79.5) radius 4.5 projected
  point P0 (0, -13.5)
  dimension "d48" = 3
  dimension "d51" = 3
extrude "Wyciągnięcie proste9" cut sketch "Szkic11" against normal blind 19.1
equation "\"d51\" = d48"
properties part number "wheel-adapter-front"
